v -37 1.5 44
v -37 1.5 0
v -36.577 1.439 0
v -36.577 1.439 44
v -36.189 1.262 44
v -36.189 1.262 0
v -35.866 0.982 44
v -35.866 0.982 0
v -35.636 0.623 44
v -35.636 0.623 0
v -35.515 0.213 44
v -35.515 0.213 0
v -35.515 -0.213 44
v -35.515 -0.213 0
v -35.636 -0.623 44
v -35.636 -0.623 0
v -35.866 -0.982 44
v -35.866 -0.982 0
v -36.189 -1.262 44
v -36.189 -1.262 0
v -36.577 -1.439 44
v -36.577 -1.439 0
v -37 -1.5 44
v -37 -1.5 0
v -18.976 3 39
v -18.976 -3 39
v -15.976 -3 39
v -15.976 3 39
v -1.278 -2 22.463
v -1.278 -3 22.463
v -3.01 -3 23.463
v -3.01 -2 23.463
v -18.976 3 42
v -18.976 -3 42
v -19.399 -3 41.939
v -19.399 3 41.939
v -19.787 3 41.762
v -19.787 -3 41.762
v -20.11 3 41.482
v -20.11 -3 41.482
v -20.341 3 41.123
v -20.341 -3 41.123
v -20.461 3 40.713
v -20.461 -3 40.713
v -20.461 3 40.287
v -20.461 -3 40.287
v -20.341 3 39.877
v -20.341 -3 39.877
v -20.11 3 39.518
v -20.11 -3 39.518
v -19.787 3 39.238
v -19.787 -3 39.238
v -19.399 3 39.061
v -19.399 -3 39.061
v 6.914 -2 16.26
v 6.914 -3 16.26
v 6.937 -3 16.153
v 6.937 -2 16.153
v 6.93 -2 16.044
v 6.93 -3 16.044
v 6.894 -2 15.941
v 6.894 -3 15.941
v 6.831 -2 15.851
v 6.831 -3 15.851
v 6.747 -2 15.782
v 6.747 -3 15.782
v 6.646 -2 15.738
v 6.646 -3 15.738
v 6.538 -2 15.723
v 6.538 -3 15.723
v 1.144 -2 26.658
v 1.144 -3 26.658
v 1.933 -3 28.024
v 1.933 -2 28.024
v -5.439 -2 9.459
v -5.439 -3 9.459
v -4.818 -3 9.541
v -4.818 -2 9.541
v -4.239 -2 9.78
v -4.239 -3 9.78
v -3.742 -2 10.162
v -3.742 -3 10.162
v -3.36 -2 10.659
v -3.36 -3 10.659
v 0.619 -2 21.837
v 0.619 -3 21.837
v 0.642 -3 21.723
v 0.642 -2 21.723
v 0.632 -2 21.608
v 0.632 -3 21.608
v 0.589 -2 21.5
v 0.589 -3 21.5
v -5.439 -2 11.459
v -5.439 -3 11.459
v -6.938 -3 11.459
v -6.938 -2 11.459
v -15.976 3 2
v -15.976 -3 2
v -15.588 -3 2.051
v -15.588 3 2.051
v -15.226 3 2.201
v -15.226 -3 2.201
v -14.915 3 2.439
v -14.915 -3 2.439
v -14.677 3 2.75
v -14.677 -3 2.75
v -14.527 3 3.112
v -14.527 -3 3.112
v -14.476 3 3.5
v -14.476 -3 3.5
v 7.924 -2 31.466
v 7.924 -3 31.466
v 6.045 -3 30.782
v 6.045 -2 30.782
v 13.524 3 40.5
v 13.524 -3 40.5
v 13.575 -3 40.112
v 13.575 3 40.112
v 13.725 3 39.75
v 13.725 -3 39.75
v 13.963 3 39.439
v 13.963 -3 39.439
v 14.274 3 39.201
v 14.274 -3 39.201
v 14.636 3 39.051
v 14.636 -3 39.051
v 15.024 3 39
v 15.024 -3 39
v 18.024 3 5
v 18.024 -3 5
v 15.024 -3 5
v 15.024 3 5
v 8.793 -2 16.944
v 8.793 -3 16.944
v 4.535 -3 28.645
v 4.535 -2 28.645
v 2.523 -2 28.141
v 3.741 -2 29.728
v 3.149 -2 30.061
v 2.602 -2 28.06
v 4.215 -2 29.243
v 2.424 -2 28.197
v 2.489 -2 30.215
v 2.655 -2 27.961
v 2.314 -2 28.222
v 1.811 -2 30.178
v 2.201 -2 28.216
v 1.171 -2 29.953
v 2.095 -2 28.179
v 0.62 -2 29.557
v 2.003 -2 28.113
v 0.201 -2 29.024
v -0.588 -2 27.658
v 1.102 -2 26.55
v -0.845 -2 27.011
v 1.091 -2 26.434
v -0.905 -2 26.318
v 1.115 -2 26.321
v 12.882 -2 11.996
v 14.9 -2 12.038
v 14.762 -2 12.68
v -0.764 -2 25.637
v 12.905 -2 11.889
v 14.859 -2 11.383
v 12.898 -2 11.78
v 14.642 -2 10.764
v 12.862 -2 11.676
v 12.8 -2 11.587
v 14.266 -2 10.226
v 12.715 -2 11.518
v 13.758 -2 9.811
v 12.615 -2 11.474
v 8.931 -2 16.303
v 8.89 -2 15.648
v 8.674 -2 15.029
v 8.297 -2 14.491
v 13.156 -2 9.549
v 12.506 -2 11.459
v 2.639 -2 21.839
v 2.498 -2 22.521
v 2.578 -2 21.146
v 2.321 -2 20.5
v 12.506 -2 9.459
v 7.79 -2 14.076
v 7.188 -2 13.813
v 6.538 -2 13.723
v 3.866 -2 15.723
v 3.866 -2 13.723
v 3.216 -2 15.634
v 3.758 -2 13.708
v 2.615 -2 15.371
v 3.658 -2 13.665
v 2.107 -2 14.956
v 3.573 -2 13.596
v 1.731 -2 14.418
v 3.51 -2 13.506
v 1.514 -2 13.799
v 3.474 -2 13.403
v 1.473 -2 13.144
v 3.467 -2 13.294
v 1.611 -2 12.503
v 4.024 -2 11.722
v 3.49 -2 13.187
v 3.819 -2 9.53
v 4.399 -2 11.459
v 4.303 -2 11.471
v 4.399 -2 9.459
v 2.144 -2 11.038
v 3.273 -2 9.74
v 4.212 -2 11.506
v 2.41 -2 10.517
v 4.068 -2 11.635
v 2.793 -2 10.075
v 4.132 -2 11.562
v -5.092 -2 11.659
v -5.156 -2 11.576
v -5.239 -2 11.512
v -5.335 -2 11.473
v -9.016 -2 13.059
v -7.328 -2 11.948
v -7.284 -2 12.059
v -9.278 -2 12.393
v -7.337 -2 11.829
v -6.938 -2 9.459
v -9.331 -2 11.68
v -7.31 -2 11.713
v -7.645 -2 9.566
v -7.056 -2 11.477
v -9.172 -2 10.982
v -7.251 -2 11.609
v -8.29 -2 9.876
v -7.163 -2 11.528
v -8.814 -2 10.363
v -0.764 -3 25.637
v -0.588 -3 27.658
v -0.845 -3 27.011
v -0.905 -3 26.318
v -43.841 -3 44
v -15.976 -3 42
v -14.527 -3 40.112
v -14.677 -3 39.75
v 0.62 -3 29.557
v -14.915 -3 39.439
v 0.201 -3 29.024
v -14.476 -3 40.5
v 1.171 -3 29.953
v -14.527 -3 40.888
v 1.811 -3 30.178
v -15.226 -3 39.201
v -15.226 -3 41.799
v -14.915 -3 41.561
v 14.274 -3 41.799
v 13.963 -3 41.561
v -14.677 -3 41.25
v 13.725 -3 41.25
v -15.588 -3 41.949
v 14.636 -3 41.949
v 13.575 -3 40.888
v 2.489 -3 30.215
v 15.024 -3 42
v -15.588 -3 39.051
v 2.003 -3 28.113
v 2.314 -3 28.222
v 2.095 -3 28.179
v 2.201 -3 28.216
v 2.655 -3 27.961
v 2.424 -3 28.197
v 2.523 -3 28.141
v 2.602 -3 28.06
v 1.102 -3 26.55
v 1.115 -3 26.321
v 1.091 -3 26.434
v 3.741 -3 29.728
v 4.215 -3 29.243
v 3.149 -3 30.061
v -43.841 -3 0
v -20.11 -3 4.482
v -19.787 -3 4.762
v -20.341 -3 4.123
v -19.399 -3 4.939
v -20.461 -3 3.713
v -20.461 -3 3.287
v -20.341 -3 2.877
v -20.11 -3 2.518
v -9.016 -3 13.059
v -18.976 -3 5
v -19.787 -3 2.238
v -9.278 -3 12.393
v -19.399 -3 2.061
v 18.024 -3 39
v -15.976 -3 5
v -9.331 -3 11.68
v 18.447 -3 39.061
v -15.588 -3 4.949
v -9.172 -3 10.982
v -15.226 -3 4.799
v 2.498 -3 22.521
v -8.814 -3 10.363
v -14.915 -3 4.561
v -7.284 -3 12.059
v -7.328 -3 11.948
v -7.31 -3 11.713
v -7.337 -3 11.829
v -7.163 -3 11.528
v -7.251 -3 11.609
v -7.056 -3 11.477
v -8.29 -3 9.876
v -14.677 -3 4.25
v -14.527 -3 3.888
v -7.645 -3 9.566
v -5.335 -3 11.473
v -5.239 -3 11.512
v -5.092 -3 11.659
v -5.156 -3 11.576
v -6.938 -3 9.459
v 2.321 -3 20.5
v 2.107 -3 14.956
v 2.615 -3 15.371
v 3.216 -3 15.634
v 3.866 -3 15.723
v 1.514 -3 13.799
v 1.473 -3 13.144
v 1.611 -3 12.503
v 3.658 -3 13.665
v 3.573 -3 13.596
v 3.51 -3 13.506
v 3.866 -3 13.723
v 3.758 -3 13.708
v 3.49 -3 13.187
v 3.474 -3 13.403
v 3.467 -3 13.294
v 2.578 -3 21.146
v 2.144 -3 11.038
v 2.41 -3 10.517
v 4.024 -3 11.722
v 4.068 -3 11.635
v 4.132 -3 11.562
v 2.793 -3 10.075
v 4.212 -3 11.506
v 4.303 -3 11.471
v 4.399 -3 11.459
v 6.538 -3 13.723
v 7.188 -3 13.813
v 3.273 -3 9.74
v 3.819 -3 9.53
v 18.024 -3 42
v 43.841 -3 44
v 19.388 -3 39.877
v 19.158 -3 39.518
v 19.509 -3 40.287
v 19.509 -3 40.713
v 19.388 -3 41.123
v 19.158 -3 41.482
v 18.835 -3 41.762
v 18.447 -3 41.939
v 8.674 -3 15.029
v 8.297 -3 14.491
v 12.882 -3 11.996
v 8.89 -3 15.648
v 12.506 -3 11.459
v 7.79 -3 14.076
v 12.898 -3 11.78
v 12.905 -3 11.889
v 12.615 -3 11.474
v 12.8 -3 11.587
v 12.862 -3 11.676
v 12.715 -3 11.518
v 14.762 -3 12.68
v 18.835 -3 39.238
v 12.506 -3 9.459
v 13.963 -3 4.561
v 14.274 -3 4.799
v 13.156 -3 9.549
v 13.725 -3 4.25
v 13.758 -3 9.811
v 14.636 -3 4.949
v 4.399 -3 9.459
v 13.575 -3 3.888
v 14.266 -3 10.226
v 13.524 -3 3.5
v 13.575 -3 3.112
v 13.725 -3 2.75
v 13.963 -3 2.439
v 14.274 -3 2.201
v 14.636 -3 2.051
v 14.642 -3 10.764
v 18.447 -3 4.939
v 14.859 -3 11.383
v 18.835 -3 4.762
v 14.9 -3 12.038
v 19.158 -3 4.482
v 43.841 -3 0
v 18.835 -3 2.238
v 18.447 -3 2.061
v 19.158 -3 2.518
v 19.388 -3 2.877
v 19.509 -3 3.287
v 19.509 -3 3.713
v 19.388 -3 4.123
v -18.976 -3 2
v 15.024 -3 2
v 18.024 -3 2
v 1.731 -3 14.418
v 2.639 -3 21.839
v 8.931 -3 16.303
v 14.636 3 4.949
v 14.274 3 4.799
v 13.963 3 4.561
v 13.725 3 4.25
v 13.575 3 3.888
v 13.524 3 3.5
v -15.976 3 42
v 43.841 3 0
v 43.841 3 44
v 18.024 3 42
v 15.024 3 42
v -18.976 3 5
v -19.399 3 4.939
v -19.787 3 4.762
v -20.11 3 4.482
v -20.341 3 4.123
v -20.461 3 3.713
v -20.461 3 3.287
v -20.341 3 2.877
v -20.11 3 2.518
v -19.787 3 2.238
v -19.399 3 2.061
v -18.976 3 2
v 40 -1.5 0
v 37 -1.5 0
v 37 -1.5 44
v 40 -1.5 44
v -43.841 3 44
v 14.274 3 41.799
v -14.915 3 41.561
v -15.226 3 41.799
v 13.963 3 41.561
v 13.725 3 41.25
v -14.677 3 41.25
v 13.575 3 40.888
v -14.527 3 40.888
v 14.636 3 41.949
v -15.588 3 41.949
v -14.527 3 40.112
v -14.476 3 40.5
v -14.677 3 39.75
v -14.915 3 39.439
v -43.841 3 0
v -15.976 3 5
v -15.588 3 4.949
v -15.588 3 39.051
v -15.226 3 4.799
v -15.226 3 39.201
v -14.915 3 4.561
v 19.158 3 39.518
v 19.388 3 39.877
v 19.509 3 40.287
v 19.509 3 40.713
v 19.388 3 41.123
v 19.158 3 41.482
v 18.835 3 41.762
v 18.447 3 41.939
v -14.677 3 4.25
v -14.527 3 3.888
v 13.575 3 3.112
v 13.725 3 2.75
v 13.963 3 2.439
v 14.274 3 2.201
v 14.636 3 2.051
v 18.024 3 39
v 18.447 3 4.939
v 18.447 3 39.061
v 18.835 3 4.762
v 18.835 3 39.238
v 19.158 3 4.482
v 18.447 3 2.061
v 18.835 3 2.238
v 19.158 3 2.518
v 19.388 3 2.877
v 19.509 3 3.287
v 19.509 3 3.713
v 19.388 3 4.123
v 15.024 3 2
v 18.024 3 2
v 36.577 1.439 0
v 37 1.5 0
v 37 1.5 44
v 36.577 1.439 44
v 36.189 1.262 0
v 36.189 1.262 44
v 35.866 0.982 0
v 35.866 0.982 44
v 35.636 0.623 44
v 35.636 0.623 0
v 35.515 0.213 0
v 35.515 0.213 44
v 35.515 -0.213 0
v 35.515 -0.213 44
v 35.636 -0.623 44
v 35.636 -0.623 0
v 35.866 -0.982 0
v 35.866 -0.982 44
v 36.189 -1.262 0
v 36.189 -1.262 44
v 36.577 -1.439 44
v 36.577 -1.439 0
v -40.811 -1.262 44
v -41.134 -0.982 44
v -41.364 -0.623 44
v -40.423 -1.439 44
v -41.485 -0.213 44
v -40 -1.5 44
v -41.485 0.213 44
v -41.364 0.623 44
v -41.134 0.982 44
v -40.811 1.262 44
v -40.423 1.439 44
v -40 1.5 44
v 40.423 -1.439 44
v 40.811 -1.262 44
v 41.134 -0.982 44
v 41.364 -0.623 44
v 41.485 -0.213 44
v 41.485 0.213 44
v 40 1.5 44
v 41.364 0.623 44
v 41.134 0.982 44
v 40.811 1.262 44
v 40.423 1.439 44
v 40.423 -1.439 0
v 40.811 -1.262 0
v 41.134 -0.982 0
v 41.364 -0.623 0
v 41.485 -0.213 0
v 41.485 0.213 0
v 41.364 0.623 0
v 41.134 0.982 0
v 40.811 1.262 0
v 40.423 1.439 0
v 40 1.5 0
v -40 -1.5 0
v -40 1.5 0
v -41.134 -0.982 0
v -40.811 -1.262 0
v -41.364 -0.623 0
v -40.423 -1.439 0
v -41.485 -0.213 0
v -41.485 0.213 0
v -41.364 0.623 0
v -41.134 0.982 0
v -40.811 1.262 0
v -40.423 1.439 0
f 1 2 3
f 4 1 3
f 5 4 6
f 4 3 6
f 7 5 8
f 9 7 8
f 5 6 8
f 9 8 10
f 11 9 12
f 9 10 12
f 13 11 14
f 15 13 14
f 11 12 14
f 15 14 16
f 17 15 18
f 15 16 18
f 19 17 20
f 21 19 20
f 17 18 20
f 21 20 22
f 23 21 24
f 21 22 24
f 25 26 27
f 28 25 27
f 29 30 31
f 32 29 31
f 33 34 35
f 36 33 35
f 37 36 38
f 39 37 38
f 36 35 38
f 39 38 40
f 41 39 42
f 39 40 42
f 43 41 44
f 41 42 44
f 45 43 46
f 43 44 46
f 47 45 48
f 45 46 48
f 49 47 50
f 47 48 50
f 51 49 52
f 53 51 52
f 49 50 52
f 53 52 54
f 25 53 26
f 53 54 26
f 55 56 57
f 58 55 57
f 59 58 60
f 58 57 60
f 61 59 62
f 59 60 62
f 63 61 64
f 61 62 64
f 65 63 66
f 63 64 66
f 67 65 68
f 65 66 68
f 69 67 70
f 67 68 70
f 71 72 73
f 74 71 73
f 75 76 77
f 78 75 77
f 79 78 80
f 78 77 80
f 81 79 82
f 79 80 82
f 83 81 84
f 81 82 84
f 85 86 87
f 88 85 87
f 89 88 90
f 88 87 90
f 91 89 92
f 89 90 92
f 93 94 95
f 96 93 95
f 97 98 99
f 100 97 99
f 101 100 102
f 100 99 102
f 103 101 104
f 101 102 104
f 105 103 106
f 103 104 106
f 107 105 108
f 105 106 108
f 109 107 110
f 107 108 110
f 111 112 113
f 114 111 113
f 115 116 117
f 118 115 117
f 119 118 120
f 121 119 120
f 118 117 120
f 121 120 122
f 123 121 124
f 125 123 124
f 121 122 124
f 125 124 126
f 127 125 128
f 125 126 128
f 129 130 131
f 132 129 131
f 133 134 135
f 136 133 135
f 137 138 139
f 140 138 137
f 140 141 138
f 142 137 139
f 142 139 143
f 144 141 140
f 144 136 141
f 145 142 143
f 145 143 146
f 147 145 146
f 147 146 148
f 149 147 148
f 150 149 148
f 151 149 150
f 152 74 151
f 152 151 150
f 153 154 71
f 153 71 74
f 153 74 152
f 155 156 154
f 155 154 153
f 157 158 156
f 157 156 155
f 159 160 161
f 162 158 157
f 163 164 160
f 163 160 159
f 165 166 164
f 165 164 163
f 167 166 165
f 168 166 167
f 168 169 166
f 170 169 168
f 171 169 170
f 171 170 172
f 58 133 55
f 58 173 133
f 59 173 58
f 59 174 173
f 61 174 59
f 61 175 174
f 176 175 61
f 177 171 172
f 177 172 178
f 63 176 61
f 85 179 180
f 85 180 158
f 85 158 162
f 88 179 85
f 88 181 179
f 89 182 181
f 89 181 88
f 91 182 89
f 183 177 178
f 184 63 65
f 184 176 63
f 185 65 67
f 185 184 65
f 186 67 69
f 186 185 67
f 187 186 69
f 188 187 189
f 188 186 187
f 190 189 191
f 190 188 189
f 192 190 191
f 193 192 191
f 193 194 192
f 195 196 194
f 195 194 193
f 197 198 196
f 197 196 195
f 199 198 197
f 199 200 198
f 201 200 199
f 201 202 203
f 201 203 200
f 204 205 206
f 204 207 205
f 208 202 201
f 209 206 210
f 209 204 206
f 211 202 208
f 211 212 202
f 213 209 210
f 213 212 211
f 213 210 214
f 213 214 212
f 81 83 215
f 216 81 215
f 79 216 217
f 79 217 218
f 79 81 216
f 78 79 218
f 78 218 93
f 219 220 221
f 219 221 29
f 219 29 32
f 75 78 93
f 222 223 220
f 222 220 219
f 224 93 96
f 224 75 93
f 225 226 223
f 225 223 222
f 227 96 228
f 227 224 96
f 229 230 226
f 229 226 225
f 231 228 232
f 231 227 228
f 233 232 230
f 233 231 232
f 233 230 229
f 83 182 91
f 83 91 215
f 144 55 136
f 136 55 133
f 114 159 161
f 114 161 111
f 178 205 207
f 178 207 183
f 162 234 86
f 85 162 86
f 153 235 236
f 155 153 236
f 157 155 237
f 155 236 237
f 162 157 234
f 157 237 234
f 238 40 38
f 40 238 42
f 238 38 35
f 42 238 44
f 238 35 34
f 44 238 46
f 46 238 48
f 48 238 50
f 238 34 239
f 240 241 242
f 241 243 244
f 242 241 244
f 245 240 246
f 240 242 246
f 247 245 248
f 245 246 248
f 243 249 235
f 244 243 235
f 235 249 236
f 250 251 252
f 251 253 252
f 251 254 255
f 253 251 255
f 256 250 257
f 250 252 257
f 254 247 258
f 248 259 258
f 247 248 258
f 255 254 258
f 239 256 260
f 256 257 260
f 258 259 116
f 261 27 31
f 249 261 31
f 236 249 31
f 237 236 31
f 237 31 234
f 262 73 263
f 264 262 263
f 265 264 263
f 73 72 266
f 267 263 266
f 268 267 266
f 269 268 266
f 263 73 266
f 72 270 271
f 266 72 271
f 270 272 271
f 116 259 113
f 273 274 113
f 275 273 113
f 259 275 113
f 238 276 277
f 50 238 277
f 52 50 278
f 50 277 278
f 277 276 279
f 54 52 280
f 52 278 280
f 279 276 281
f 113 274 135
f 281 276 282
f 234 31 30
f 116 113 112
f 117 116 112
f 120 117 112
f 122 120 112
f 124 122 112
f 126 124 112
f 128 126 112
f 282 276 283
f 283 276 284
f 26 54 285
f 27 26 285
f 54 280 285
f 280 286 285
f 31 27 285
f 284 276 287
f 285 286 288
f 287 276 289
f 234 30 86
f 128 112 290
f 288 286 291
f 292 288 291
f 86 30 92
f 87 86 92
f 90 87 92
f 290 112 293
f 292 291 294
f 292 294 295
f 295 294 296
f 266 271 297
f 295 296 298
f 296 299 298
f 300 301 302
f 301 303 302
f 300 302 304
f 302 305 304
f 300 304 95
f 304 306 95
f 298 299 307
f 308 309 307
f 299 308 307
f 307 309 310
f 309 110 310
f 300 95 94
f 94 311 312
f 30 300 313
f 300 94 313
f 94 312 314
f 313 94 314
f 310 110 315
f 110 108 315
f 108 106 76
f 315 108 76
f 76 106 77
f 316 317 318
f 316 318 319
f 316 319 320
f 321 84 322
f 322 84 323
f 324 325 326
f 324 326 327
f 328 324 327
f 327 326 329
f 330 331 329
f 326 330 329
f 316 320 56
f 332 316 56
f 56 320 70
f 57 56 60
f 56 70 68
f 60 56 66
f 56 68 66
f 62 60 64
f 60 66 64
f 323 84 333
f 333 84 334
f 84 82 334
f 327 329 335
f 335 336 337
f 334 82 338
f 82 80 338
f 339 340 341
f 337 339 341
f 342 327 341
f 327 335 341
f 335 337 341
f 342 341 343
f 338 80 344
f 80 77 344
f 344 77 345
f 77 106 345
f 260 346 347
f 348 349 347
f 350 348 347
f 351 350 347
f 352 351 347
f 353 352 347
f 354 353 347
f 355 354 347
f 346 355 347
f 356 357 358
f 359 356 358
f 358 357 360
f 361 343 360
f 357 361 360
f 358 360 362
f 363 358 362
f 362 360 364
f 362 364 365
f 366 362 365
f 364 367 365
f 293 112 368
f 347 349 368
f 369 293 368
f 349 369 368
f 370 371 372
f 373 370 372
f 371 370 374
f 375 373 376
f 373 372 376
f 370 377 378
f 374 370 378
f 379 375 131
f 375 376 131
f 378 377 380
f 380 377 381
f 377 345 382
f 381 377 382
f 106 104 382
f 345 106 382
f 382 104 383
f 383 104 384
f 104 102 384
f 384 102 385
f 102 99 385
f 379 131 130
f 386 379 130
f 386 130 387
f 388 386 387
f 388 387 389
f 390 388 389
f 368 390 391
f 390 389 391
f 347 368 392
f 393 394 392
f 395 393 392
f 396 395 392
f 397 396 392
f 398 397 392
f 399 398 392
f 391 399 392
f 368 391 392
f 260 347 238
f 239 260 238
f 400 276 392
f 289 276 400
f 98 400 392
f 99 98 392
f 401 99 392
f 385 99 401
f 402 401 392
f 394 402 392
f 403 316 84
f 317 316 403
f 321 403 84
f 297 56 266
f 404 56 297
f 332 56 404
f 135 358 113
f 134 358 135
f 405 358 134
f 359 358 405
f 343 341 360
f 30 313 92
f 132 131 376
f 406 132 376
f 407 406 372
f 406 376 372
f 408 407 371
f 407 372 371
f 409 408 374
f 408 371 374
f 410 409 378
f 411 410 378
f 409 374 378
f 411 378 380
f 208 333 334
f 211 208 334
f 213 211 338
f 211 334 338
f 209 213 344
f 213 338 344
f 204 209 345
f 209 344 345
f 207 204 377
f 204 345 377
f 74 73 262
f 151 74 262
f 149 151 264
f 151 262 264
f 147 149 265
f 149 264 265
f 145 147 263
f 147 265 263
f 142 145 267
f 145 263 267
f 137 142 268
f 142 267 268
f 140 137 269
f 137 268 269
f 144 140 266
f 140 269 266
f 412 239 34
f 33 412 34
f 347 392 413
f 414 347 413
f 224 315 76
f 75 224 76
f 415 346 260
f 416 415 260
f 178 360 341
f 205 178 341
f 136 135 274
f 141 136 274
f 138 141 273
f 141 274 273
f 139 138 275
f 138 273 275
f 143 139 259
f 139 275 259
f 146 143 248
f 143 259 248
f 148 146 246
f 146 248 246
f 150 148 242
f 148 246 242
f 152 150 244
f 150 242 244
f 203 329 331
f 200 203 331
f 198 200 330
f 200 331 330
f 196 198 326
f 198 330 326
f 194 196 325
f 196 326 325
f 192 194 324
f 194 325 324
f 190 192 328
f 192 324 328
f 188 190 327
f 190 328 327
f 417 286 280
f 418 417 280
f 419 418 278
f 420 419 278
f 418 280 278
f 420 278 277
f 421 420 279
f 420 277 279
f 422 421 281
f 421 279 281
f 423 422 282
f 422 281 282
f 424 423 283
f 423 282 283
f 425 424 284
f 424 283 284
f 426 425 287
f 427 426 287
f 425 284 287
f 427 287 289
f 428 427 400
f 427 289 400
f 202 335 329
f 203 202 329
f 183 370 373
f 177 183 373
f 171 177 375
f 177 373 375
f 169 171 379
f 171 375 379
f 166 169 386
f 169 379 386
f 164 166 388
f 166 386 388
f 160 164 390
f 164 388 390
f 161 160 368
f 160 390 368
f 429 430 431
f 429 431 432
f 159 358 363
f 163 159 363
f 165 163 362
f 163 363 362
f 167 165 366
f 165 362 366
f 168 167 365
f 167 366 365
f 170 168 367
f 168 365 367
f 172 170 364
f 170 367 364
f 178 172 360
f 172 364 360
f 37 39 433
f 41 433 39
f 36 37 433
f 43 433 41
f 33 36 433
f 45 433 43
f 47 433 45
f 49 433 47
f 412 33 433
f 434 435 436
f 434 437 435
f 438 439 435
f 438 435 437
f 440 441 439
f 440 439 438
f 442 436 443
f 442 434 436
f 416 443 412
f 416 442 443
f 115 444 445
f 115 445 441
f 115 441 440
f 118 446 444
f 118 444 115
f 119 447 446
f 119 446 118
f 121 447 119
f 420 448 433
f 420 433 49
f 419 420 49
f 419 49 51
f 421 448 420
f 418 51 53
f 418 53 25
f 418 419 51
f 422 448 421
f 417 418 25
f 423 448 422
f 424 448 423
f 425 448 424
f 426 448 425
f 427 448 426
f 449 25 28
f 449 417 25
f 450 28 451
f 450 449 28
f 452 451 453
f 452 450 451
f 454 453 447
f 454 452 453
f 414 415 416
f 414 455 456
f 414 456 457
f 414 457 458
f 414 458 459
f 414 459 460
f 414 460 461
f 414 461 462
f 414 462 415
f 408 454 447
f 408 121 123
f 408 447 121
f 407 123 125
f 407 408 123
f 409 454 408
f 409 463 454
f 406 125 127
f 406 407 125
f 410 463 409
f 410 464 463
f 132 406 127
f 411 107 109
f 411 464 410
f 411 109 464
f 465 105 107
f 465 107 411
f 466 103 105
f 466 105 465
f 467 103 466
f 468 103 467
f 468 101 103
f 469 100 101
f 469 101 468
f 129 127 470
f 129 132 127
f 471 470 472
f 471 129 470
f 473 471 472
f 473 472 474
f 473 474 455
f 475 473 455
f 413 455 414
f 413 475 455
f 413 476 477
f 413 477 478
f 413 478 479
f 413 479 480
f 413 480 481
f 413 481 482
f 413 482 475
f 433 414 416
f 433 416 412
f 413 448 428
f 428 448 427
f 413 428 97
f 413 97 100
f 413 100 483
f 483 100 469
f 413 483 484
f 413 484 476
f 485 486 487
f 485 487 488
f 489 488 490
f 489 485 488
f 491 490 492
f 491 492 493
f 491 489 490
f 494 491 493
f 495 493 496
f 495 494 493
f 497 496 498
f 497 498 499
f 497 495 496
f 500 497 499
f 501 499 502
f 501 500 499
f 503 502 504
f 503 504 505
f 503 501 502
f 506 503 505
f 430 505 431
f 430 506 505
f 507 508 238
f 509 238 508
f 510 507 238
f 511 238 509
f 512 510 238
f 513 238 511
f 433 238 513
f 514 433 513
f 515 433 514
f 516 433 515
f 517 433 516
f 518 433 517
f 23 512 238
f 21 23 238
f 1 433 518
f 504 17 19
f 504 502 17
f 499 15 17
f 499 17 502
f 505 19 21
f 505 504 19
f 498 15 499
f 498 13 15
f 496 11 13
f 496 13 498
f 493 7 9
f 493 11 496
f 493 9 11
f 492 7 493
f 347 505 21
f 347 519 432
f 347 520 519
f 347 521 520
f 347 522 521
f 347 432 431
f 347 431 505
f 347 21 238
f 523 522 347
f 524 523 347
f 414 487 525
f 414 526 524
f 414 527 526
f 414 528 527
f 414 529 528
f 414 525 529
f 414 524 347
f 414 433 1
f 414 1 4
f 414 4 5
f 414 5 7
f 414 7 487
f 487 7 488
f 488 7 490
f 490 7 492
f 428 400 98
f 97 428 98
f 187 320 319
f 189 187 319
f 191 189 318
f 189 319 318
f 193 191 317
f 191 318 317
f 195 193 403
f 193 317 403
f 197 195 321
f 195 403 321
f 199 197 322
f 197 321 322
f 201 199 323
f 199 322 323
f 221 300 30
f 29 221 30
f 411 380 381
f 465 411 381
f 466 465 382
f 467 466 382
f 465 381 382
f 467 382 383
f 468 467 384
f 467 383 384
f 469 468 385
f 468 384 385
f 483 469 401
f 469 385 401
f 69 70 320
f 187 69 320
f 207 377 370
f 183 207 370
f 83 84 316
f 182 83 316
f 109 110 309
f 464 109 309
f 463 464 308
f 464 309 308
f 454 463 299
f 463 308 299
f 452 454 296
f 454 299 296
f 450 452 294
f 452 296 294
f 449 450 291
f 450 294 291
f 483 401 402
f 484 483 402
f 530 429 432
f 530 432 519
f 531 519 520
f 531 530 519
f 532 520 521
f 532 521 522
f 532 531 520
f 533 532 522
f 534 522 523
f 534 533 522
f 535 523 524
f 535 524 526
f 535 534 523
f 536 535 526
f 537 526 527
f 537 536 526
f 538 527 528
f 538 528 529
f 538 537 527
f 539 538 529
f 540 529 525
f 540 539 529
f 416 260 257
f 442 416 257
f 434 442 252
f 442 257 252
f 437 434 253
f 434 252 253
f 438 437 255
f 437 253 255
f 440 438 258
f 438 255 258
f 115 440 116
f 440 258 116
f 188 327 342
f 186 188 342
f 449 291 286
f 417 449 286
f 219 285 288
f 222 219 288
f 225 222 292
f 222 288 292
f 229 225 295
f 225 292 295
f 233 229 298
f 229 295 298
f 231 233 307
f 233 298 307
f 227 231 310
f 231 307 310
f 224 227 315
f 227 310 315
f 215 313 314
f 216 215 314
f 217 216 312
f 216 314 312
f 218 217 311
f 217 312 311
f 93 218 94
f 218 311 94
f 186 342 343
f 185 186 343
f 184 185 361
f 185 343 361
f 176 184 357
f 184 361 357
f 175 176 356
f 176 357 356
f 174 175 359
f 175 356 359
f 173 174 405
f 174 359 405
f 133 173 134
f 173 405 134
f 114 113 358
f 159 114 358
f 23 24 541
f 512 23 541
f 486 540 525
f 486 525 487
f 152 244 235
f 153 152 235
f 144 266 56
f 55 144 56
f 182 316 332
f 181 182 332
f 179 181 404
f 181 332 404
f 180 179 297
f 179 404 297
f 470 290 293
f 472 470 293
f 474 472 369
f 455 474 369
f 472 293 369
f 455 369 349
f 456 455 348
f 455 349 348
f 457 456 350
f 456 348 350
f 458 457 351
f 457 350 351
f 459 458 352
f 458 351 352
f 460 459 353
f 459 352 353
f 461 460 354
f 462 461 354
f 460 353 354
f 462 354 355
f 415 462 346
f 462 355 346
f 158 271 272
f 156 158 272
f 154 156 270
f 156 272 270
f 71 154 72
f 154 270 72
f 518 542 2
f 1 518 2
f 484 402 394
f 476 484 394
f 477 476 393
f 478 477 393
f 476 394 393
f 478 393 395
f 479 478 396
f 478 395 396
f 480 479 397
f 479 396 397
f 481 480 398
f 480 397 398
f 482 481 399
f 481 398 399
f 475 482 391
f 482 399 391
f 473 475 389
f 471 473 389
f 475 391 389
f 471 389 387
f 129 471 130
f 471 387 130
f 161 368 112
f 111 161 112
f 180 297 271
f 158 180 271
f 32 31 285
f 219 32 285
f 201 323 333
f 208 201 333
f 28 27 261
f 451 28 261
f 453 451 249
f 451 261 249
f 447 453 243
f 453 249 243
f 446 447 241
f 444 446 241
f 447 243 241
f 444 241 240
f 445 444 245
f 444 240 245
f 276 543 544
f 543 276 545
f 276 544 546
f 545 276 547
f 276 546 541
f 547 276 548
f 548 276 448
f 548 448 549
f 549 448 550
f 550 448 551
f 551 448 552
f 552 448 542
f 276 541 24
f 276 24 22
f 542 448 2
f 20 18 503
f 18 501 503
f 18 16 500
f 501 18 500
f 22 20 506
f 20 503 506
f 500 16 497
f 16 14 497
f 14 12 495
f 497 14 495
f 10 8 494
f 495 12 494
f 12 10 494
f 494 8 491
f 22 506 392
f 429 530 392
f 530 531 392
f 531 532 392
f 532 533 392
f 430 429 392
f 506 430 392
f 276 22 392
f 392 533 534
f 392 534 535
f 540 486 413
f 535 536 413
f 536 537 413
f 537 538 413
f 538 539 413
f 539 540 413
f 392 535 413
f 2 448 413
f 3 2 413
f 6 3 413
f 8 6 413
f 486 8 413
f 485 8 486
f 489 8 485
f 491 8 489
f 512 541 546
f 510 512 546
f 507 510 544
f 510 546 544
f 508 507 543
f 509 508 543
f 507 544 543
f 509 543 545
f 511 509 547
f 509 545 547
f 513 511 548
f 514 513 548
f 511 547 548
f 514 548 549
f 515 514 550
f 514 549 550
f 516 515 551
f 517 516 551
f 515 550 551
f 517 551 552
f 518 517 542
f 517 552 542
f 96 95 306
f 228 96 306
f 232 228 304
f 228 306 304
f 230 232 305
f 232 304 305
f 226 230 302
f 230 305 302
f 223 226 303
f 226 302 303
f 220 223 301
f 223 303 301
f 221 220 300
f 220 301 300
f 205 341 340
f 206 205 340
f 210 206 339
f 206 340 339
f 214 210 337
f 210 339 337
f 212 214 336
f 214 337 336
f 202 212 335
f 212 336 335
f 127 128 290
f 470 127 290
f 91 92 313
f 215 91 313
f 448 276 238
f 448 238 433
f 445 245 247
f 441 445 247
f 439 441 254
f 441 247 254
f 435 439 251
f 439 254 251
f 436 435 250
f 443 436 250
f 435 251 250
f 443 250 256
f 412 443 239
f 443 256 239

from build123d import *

# Parameters (mm, degrees)
SKETCH_1_W               = 87.68124
SKETCH_1_H               = 6
EXTRUDE_1_DEPTH          = 44
CUT_EXTRUDE_1_DEPTH      = 1
CUT_EXTRUDE_1_DEPTH_BACK = 1
CUT_EXTRUDE_1_2_DEPTH    = 44


with BuildPart() as part:
    # 草图1 → 凸台-拉伸1 (new body)
    with BuildSketch(Plane.XY):
        Rectangle(SKETCH_1_W, SKETCH_1_H)
        with BuildLine():
            Line((-40, 1.5), (-37, 1.5))
            ThreePointArc((-37, 1.5), (-35.5, 0), (-37, -1.5))
            Line((-37, -1.5), (-40, -1.5))
            ThreePointArc((-40, -1.5), (-41.5, 0), (-40, 1.5))
        make_face(mode=Mode.SUBTRACT)
        with BuildLine():
            Line((40, 1.5), (37, 1.5))
            ThreePointArc((37, 1.5), (35.5, 0), (37, -1.5))
            Line((37, -1.5), (40, -1.5))
            ThreePointArc((40, -1.5), (41.5, 0), (40, 1.5))
        make_face(mode=Mode.SUBTRACT)
    extrude(amount=EXTRUDE_1_DEPTH)

    # 草图2 → Cut-Extrude 1 (cut, two sides)
    with BuildSketch(Plane(origin=(0, -3, 0), x_dir=(-1, 0, 0), z_dir=(0, -1, 0))) as cut_extrude_1_sk:
        with BuildLine():
            Line((3.009641995, -23.462761216), (9.016320028, -13.058889678))
            ThreePointArc((9.016320028, -13.058889678), (9.016320028, -10.658889678), (6.937859059, -9.458889678))
            Line((6.937859059, -9.458889678), (5.438821813, -9.458889678))
            ThreePointArc((5.438821813, -9.458889678), (4.238821813, -9.780428709), (3.360360844, -10.658889678))
            Line((3.360360844, -10.658889678), (-2.321304295, -20.499822371))
            ThreePointArc((-2.321304295, -20.499822371), (-2.633710601, -21.490648588), (-2.498105616, -22.520670715))
            Line((-2.498105616, -22.520670715), (-1.114919938, -26.320942131))
            ThreePointArc((-1.114919938, -26.320942131), (-1.092319107, -26.492612485), (-1.144386825, -26.657750188))
            Line((-1.144386825, -26.657750188), (-1.93306975, -28.023789086))
            ThreePointArc((-1.93306975, -28.023789086), (-2.314342209, -28.222266966), (-2.65535696, -27.960597144))
            Line((-2.65535696, -27.960597144), (-6.91393735, -16.260243683))
            ThreePointArc((-6.91393735, -16.260243683), (-6.86572112, -15.894005051), (-6.538060302, -15.723435626))
            Line((-6.538060302, -15.723435626), (-3.866358933, -15.723435626))
            ThreePointArc((-3.866358933, -15.723435626), (-1.900394027, -14.700019073), (-1.611096643, -12.502587282))
            Line((-1.611096643, -12.502587282), (-2.144147775, -11.038041334))
            ThreePointArc((-2.144147775, -11.038041334), (-3.022826617, -9.892924772), (-4.399410065, -9.458889678))
            Line((-4.399410065, -9.458889678), (-12.506390341, -9.458889678))
            ThreePointArc((-12.506390341, -9.458889678), (-14.472355248, -10.482306231), (-14.761652631, -12.679738022))
            Line((-14.761652631, -12.679738022), (-7.924054064, -31.46588569))
            Line((-7.924054064, -31.46588569), (-6.044668822, -30.781845403))
            Line((-6.044668822, -30.781845403), (-12.88226739, -11.995697736))
            ThreePointArc((-12.88226739, -11.995697736), (-12.834051159, -11.629459104), (-12.506390341, -11.458889678))
            Line((-12.506390341, -11.458889678), (-4.399410065, -11.458889678))
            ThreePointArc((-4.399410065, -11.458889678), (-4.16997949, -11.531228861), (-4.023533016, -11.722081621))
            Line((-4.023533016, -11.722081621), (-3.490481885, -13.186627568))
            ThreePointArc((-3.490481885, -13.186627568), (-3.538698115, -13.5528662), (-3.866358933, -13.723435626))
            Line((-3.866358933, -13.723435626), (-6.538060302, -13.723435626))
            ThreePointArc((-6.538060302, -13.723435626), (-8.504025208, -14.746852178), (-8.793322592, -16.94428397))
            Line((-8.793322592, -16.94428397), (-4.534742202, -28.64463743))
            ThreePointArc((-4.534742202, -28.64463743), (-2.488653694, -30.214656362), (-0.201018943, -29.023789086))
            Line((-0.201018943, -29.023789086), (0.587663983, -27.657750188))
            ThreePointArc((0.587663983, -27.657750188), (0.900070289, -26.666923971), (0.764465304, -25.636901844))
            Line((0.764465304, -25.636901844), (-0.618720374, -21.836630428))
            ThreePointArc((-0.618720374, -21.836630428), (-0.641321205, -21.664960074), (-0.589253487, -21.499822371))
            Line((-0.589253487, -21.499822371), (5.092411652, -11.658889678))
            ThreePointArc((5.092411652, -11.658889678), (5.238821813, -11.512479517), (5.438821813, -11.458889678))
            Line((5.438821813, -11.458889678), (6.937859059, -11.458889678))
            ThreePointArc((6.937859059, -11.458889678), (7.28426922, -11.658889678), (7.28426922, -12.058889678))
            Line((7.28426922, -12.058889678), (1.277591188, -22.462761216))
            Line((1.277591188, -22.462761216), (3.009641995, -23.462761216))
        make_face()
    extrude(amount=CUT_EXTRUDE_1_DEPTH, mode=Mode.SUBTRACT)
    extrude(cut_extrude_1_sk.sketch, amount=-CUT_EXTRUDE_1_DEPTH_BACK, mode=Mode.SUBTRACT)

    # 草图3 → Cut-Extrude 1 2 (cut)
    with BuildSketch(Plane.XZ.offset(3)):
        with BuildLine():
            Line((-18.97606525, 39), (-18.97606525, 40.5))
            Line((-18.97606525, 40.5), (-14.47606525, 40.5))
            ThreePointArc((-14.47606525, 40.5), (-14.915405078, 41.560660172), (-15.97606525, 42))
            Line((-15.97606525, 42), (-18.97606525, 42))
            ThreePointArc((-18.97606525, 42), (-20.47606525, 40.5), (-18.97606525, 39))
        make_face()
        with BuildLine():
            ThreePointArc((15.02393475, 42), (13.963274579, 41.560660172), (13.52393475, 40.5))
            Line((13.52393475, 40.5), (18.02393475, 40.5))
            Line((18.02393475, 40.5), (18.02393475, 39))
            ThreePointArc((18.02393475, 39), (19.52393475, 40.5), (18.02393475, 42))
            Line((18.02393475, 42), (15.02393475, 42))
        make_face()
        with BuildLine():
            ThreePointArc((18.02393475, 2), (19.52393475, 3.5), (18.02393475, 5))
            Line((18.02393475, 5), (18.02393475, 3.5))
            Line((18.02393475, 3.5), (13.52393475, 3.5))
            ThreePointArc((13.52393475, 3.5), (13.963274579, 2.439339828), (15.02393475, 2))
            Line((15.02393475, 2), (18.02393475, 2))
        make_face()
        with BuildLine():
            Line((-18.97606525, 3.5), (-18.97606525, 5))
            ThreePointArc((-18.97606525, 5), (-20.47606525, 3.5), (-18.97606525, 2))
            Line((-18.97606525, 2), (-15.97606525, 2))
            ThreePointArc((-15.97606525, 2), (-14.915405078, 2.439339828), (-14.47606525, 3.5))
            Line((-14.47606525, 3.5), (-18.97606525, 3.5))
        make_face()
        with BuildLine():
            Line((-15.97606525, 5), (-18.97606525, 5))
            Line((-18.97606525, 5), (-18.97606525, 3.5))
            Line((-18.97606525, 3.5), (-14.47606525, 3.5))
            ThreePointArc((-14.47606525, 3.5), (-14.915405078, 4.560660172), (-15.97606525, 5))
        make_face()
        with BuildLine():
            Line((-14.47606525, 40.5), (-18.97606525, 40.5))
            Line((-18.97606525, 40.5), (-18.97606525, 39))
            Line((-18.97606525, 39), (-15.97606525, 39))
            ThreePointArc((-15.97606525, 39), (-14.915405078, 39.439339828), (-14.47606525, 40.5))
        make_face()
        with BuildLine():
            Line((18.02393475, 40.5), (13.52393475, 40.5))
            ThreePointArc((13.52393475, 40.5), (13.963274579, 39.439339828), (15.02393475, 39))
            Line((15.02393475, 39), (18.02393475, 39))
            Line((18.02393475, 39), (18.02393475, 40.5))
        make_face()
        with BuildLine():
            Line((18.02393475, 3.5), (18.02393475, 5))
            Line((18.02393475, 5), (15.02393475, 5))
            ThreePointArc((15.02393475, 5), (13.963274579, 4.560660172), (13.52393475, 3.5))
            Line((13.52393475, 3.5), (18.02393475, 3.5))
        make_face()
    extrude(amount=-CUT_EXTRUDE_1_2_DEPTH, mode=Mode.SUBTRACT)


solid = part.part
